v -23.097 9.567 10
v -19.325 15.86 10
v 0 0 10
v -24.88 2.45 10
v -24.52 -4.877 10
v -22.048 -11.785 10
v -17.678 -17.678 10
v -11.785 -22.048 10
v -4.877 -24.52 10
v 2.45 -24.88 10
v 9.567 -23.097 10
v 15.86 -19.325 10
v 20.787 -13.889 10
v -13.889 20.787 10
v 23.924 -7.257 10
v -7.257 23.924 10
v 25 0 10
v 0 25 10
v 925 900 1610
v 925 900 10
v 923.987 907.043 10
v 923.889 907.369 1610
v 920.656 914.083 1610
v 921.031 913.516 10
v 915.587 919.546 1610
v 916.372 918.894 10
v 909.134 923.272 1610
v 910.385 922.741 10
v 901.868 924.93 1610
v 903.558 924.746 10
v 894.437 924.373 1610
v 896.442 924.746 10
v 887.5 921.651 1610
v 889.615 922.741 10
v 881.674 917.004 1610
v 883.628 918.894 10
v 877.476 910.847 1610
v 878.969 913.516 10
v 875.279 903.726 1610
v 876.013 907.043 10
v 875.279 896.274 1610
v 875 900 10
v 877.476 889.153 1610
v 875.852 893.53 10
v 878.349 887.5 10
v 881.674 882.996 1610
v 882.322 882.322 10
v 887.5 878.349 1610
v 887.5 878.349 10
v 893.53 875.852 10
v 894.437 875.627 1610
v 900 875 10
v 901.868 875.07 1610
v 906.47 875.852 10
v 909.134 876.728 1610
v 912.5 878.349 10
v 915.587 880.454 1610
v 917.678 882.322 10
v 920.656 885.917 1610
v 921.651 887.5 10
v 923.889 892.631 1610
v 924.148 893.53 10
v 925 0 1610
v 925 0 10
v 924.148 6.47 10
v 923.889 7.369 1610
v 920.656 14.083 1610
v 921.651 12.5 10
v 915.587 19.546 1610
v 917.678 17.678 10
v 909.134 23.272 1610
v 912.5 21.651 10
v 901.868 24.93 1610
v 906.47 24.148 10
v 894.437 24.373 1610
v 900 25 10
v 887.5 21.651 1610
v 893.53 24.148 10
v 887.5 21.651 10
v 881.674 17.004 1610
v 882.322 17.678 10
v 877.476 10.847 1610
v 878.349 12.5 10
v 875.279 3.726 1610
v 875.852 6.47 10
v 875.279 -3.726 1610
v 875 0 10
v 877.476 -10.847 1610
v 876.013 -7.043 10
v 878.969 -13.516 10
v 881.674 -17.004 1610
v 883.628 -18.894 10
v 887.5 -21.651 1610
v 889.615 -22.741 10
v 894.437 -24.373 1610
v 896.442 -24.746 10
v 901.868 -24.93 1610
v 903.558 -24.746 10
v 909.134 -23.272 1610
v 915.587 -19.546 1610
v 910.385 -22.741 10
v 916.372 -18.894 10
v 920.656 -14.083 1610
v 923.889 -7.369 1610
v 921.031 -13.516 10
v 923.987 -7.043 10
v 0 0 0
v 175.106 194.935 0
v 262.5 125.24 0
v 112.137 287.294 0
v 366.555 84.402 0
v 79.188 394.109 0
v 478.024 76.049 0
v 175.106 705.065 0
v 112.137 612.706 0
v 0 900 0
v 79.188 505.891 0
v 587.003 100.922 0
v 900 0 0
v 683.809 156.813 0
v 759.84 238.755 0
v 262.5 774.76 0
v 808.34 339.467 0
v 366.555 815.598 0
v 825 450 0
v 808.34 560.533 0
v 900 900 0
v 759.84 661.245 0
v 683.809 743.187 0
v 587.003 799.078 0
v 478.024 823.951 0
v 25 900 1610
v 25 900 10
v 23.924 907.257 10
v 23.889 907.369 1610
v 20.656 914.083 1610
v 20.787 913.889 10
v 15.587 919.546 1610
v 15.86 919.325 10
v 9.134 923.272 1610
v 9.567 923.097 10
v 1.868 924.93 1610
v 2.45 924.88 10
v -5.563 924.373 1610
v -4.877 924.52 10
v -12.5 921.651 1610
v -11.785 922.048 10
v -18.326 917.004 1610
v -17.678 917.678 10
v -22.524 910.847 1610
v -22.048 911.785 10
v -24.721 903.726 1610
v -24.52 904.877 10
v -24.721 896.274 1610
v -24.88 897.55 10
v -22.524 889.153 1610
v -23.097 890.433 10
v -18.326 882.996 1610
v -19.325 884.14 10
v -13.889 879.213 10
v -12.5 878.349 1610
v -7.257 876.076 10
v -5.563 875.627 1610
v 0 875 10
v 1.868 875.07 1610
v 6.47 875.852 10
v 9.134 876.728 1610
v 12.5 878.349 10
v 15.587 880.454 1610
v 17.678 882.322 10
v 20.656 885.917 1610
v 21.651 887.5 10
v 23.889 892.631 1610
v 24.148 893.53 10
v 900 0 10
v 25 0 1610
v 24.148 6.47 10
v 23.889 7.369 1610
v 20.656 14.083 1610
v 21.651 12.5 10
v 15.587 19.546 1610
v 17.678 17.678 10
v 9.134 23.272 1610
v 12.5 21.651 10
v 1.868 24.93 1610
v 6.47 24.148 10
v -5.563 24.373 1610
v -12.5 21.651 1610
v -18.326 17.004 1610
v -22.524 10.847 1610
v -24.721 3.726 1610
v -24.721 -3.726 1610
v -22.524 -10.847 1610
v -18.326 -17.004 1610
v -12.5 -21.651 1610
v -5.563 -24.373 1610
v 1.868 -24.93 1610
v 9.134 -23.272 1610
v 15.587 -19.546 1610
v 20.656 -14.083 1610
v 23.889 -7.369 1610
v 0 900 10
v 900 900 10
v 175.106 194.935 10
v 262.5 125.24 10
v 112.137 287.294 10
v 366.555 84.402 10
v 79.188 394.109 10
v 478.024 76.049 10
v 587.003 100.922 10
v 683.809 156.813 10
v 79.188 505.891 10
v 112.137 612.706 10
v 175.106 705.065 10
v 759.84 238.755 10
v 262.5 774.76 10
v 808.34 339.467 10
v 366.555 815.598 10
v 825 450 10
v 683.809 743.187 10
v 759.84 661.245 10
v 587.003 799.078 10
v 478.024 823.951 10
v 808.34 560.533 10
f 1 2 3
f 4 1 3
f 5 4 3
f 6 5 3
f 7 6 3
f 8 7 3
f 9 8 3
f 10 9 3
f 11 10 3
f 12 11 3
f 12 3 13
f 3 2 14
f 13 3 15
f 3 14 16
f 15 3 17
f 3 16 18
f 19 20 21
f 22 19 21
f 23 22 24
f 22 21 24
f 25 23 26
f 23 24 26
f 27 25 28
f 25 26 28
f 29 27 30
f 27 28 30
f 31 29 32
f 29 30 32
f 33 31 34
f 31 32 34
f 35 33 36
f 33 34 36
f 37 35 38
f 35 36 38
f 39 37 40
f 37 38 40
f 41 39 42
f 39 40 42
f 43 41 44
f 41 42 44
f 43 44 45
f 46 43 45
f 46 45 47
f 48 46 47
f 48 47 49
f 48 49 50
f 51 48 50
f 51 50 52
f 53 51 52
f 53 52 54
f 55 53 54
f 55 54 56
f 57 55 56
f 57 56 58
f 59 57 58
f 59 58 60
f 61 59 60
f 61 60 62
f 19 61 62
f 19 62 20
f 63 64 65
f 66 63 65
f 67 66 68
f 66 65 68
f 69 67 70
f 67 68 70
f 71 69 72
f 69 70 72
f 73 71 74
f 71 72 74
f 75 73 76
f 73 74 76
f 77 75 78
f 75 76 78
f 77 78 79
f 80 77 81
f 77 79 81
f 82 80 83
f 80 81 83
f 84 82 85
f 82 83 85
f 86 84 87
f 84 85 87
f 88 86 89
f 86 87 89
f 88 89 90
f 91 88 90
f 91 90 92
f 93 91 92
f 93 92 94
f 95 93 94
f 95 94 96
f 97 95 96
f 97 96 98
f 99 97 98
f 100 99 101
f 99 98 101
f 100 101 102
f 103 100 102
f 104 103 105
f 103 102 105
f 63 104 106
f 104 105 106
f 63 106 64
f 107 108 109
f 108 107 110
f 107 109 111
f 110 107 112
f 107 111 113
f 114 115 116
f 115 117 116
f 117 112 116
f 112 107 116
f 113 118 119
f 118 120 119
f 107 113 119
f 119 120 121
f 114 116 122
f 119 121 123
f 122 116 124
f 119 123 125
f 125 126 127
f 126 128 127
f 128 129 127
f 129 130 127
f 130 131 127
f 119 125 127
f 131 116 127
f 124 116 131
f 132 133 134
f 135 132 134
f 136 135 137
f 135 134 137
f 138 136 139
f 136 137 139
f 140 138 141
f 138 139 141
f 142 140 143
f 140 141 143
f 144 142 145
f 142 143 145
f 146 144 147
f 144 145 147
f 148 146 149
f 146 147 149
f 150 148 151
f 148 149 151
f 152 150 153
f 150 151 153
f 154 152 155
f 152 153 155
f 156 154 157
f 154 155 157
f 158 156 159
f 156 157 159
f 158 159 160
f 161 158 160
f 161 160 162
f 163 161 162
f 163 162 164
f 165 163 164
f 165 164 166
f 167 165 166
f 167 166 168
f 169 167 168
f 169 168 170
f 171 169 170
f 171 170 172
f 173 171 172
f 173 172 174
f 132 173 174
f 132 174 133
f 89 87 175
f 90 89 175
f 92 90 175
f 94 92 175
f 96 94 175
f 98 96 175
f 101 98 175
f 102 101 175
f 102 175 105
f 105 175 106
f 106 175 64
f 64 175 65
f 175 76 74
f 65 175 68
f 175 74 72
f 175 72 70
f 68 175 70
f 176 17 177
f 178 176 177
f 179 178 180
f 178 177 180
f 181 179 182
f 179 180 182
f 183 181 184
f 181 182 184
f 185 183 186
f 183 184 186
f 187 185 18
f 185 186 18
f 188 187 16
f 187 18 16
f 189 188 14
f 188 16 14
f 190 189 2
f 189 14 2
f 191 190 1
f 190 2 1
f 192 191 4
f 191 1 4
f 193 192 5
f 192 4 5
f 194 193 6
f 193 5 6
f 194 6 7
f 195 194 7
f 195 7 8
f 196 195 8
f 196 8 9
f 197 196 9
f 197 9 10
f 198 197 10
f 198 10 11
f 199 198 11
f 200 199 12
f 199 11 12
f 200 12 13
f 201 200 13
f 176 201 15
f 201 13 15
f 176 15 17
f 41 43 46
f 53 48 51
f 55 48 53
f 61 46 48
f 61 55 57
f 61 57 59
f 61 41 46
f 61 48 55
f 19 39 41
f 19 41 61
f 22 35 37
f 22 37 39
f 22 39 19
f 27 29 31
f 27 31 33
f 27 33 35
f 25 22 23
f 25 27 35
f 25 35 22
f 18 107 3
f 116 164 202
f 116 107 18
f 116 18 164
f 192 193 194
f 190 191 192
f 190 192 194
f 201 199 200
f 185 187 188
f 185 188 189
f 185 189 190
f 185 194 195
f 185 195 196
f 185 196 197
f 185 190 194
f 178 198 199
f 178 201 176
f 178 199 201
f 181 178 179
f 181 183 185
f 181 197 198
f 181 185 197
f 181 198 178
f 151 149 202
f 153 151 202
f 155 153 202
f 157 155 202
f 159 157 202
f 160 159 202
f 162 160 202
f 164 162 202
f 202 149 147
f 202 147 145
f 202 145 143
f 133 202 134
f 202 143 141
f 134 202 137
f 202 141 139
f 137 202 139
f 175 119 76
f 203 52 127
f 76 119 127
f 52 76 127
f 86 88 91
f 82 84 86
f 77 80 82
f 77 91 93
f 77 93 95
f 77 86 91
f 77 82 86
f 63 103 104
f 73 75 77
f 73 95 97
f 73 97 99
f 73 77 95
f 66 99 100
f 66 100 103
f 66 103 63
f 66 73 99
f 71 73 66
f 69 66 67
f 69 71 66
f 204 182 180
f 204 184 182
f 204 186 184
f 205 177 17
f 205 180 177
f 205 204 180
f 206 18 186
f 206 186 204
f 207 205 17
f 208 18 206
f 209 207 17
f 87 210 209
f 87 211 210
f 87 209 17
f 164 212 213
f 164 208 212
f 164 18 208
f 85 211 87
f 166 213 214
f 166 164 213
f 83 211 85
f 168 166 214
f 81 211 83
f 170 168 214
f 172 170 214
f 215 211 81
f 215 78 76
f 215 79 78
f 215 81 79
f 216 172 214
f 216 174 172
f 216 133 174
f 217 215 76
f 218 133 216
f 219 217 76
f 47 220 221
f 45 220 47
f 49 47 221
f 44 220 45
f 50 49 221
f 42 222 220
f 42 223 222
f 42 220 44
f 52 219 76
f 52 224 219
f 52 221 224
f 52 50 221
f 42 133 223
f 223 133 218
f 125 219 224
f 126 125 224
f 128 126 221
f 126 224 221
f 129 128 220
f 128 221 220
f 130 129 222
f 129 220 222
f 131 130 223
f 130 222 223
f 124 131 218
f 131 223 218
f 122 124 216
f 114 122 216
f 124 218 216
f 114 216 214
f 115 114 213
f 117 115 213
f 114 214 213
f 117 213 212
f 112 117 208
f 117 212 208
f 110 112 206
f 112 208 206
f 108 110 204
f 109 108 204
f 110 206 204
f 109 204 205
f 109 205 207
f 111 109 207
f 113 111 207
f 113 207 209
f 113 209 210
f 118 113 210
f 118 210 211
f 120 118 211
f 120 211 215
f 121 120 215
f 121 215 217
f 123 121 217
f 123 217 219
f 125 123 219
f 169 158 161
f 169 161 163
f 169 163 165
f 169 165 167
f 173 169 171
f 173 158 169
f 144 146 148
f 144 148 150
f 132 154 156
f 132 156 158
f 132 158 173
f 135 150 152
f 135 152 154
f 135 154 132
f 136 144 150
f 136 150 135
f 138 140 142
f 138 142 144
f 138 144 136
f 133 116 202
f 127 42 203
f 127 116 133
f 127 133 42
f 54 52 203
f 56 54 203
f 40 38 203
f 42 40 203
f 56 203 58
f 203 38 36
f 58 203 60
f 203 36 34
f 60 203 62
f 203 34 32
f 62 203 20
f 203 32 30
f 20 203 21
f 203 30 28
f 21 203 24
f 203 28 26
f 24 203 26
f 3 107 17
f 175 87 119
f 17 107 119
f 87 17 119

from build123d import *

# Parameters (mm, degrees)
F0_W     = 900
F0_H     = 900
F1_DEPTH = 10
F2_R     = 25
F3_DEPTH = 1600
F4_R     = 375
F5_DEPTH = 10.001


with BuildPart() as f1:
    # F0 (on Top) → F1 (new body)
    with BuildSketch(Plane.XY):
        with Locations((450, 450)):
            Rectangle(F0_W, F0_H)
    extrude(amount=F1_DEPTH)

    # F2 (on face) → F3 (join)
    with BuildSketch(Plane.XY.offset(10)):
        Circle(F2_R)
        with Locations((0, 900)):
            Circle(F2_R)
        with Locations((900, 900)):
            Circle(F2_R)
        with Locations((900, 0)):
            Circle(F2_R)
    extrude(amount=F3_DEPTH)

    # F4 (on face) → F5 (cut, through all)
    with BuildSketch(Plane.XY.offset(10)):
        with Locations((450, 450)):
            Circle(F4_R)
    extrude(amount=-F5_DEPTH, mode=Mode.SUBTRACT)


solid = f1.part
